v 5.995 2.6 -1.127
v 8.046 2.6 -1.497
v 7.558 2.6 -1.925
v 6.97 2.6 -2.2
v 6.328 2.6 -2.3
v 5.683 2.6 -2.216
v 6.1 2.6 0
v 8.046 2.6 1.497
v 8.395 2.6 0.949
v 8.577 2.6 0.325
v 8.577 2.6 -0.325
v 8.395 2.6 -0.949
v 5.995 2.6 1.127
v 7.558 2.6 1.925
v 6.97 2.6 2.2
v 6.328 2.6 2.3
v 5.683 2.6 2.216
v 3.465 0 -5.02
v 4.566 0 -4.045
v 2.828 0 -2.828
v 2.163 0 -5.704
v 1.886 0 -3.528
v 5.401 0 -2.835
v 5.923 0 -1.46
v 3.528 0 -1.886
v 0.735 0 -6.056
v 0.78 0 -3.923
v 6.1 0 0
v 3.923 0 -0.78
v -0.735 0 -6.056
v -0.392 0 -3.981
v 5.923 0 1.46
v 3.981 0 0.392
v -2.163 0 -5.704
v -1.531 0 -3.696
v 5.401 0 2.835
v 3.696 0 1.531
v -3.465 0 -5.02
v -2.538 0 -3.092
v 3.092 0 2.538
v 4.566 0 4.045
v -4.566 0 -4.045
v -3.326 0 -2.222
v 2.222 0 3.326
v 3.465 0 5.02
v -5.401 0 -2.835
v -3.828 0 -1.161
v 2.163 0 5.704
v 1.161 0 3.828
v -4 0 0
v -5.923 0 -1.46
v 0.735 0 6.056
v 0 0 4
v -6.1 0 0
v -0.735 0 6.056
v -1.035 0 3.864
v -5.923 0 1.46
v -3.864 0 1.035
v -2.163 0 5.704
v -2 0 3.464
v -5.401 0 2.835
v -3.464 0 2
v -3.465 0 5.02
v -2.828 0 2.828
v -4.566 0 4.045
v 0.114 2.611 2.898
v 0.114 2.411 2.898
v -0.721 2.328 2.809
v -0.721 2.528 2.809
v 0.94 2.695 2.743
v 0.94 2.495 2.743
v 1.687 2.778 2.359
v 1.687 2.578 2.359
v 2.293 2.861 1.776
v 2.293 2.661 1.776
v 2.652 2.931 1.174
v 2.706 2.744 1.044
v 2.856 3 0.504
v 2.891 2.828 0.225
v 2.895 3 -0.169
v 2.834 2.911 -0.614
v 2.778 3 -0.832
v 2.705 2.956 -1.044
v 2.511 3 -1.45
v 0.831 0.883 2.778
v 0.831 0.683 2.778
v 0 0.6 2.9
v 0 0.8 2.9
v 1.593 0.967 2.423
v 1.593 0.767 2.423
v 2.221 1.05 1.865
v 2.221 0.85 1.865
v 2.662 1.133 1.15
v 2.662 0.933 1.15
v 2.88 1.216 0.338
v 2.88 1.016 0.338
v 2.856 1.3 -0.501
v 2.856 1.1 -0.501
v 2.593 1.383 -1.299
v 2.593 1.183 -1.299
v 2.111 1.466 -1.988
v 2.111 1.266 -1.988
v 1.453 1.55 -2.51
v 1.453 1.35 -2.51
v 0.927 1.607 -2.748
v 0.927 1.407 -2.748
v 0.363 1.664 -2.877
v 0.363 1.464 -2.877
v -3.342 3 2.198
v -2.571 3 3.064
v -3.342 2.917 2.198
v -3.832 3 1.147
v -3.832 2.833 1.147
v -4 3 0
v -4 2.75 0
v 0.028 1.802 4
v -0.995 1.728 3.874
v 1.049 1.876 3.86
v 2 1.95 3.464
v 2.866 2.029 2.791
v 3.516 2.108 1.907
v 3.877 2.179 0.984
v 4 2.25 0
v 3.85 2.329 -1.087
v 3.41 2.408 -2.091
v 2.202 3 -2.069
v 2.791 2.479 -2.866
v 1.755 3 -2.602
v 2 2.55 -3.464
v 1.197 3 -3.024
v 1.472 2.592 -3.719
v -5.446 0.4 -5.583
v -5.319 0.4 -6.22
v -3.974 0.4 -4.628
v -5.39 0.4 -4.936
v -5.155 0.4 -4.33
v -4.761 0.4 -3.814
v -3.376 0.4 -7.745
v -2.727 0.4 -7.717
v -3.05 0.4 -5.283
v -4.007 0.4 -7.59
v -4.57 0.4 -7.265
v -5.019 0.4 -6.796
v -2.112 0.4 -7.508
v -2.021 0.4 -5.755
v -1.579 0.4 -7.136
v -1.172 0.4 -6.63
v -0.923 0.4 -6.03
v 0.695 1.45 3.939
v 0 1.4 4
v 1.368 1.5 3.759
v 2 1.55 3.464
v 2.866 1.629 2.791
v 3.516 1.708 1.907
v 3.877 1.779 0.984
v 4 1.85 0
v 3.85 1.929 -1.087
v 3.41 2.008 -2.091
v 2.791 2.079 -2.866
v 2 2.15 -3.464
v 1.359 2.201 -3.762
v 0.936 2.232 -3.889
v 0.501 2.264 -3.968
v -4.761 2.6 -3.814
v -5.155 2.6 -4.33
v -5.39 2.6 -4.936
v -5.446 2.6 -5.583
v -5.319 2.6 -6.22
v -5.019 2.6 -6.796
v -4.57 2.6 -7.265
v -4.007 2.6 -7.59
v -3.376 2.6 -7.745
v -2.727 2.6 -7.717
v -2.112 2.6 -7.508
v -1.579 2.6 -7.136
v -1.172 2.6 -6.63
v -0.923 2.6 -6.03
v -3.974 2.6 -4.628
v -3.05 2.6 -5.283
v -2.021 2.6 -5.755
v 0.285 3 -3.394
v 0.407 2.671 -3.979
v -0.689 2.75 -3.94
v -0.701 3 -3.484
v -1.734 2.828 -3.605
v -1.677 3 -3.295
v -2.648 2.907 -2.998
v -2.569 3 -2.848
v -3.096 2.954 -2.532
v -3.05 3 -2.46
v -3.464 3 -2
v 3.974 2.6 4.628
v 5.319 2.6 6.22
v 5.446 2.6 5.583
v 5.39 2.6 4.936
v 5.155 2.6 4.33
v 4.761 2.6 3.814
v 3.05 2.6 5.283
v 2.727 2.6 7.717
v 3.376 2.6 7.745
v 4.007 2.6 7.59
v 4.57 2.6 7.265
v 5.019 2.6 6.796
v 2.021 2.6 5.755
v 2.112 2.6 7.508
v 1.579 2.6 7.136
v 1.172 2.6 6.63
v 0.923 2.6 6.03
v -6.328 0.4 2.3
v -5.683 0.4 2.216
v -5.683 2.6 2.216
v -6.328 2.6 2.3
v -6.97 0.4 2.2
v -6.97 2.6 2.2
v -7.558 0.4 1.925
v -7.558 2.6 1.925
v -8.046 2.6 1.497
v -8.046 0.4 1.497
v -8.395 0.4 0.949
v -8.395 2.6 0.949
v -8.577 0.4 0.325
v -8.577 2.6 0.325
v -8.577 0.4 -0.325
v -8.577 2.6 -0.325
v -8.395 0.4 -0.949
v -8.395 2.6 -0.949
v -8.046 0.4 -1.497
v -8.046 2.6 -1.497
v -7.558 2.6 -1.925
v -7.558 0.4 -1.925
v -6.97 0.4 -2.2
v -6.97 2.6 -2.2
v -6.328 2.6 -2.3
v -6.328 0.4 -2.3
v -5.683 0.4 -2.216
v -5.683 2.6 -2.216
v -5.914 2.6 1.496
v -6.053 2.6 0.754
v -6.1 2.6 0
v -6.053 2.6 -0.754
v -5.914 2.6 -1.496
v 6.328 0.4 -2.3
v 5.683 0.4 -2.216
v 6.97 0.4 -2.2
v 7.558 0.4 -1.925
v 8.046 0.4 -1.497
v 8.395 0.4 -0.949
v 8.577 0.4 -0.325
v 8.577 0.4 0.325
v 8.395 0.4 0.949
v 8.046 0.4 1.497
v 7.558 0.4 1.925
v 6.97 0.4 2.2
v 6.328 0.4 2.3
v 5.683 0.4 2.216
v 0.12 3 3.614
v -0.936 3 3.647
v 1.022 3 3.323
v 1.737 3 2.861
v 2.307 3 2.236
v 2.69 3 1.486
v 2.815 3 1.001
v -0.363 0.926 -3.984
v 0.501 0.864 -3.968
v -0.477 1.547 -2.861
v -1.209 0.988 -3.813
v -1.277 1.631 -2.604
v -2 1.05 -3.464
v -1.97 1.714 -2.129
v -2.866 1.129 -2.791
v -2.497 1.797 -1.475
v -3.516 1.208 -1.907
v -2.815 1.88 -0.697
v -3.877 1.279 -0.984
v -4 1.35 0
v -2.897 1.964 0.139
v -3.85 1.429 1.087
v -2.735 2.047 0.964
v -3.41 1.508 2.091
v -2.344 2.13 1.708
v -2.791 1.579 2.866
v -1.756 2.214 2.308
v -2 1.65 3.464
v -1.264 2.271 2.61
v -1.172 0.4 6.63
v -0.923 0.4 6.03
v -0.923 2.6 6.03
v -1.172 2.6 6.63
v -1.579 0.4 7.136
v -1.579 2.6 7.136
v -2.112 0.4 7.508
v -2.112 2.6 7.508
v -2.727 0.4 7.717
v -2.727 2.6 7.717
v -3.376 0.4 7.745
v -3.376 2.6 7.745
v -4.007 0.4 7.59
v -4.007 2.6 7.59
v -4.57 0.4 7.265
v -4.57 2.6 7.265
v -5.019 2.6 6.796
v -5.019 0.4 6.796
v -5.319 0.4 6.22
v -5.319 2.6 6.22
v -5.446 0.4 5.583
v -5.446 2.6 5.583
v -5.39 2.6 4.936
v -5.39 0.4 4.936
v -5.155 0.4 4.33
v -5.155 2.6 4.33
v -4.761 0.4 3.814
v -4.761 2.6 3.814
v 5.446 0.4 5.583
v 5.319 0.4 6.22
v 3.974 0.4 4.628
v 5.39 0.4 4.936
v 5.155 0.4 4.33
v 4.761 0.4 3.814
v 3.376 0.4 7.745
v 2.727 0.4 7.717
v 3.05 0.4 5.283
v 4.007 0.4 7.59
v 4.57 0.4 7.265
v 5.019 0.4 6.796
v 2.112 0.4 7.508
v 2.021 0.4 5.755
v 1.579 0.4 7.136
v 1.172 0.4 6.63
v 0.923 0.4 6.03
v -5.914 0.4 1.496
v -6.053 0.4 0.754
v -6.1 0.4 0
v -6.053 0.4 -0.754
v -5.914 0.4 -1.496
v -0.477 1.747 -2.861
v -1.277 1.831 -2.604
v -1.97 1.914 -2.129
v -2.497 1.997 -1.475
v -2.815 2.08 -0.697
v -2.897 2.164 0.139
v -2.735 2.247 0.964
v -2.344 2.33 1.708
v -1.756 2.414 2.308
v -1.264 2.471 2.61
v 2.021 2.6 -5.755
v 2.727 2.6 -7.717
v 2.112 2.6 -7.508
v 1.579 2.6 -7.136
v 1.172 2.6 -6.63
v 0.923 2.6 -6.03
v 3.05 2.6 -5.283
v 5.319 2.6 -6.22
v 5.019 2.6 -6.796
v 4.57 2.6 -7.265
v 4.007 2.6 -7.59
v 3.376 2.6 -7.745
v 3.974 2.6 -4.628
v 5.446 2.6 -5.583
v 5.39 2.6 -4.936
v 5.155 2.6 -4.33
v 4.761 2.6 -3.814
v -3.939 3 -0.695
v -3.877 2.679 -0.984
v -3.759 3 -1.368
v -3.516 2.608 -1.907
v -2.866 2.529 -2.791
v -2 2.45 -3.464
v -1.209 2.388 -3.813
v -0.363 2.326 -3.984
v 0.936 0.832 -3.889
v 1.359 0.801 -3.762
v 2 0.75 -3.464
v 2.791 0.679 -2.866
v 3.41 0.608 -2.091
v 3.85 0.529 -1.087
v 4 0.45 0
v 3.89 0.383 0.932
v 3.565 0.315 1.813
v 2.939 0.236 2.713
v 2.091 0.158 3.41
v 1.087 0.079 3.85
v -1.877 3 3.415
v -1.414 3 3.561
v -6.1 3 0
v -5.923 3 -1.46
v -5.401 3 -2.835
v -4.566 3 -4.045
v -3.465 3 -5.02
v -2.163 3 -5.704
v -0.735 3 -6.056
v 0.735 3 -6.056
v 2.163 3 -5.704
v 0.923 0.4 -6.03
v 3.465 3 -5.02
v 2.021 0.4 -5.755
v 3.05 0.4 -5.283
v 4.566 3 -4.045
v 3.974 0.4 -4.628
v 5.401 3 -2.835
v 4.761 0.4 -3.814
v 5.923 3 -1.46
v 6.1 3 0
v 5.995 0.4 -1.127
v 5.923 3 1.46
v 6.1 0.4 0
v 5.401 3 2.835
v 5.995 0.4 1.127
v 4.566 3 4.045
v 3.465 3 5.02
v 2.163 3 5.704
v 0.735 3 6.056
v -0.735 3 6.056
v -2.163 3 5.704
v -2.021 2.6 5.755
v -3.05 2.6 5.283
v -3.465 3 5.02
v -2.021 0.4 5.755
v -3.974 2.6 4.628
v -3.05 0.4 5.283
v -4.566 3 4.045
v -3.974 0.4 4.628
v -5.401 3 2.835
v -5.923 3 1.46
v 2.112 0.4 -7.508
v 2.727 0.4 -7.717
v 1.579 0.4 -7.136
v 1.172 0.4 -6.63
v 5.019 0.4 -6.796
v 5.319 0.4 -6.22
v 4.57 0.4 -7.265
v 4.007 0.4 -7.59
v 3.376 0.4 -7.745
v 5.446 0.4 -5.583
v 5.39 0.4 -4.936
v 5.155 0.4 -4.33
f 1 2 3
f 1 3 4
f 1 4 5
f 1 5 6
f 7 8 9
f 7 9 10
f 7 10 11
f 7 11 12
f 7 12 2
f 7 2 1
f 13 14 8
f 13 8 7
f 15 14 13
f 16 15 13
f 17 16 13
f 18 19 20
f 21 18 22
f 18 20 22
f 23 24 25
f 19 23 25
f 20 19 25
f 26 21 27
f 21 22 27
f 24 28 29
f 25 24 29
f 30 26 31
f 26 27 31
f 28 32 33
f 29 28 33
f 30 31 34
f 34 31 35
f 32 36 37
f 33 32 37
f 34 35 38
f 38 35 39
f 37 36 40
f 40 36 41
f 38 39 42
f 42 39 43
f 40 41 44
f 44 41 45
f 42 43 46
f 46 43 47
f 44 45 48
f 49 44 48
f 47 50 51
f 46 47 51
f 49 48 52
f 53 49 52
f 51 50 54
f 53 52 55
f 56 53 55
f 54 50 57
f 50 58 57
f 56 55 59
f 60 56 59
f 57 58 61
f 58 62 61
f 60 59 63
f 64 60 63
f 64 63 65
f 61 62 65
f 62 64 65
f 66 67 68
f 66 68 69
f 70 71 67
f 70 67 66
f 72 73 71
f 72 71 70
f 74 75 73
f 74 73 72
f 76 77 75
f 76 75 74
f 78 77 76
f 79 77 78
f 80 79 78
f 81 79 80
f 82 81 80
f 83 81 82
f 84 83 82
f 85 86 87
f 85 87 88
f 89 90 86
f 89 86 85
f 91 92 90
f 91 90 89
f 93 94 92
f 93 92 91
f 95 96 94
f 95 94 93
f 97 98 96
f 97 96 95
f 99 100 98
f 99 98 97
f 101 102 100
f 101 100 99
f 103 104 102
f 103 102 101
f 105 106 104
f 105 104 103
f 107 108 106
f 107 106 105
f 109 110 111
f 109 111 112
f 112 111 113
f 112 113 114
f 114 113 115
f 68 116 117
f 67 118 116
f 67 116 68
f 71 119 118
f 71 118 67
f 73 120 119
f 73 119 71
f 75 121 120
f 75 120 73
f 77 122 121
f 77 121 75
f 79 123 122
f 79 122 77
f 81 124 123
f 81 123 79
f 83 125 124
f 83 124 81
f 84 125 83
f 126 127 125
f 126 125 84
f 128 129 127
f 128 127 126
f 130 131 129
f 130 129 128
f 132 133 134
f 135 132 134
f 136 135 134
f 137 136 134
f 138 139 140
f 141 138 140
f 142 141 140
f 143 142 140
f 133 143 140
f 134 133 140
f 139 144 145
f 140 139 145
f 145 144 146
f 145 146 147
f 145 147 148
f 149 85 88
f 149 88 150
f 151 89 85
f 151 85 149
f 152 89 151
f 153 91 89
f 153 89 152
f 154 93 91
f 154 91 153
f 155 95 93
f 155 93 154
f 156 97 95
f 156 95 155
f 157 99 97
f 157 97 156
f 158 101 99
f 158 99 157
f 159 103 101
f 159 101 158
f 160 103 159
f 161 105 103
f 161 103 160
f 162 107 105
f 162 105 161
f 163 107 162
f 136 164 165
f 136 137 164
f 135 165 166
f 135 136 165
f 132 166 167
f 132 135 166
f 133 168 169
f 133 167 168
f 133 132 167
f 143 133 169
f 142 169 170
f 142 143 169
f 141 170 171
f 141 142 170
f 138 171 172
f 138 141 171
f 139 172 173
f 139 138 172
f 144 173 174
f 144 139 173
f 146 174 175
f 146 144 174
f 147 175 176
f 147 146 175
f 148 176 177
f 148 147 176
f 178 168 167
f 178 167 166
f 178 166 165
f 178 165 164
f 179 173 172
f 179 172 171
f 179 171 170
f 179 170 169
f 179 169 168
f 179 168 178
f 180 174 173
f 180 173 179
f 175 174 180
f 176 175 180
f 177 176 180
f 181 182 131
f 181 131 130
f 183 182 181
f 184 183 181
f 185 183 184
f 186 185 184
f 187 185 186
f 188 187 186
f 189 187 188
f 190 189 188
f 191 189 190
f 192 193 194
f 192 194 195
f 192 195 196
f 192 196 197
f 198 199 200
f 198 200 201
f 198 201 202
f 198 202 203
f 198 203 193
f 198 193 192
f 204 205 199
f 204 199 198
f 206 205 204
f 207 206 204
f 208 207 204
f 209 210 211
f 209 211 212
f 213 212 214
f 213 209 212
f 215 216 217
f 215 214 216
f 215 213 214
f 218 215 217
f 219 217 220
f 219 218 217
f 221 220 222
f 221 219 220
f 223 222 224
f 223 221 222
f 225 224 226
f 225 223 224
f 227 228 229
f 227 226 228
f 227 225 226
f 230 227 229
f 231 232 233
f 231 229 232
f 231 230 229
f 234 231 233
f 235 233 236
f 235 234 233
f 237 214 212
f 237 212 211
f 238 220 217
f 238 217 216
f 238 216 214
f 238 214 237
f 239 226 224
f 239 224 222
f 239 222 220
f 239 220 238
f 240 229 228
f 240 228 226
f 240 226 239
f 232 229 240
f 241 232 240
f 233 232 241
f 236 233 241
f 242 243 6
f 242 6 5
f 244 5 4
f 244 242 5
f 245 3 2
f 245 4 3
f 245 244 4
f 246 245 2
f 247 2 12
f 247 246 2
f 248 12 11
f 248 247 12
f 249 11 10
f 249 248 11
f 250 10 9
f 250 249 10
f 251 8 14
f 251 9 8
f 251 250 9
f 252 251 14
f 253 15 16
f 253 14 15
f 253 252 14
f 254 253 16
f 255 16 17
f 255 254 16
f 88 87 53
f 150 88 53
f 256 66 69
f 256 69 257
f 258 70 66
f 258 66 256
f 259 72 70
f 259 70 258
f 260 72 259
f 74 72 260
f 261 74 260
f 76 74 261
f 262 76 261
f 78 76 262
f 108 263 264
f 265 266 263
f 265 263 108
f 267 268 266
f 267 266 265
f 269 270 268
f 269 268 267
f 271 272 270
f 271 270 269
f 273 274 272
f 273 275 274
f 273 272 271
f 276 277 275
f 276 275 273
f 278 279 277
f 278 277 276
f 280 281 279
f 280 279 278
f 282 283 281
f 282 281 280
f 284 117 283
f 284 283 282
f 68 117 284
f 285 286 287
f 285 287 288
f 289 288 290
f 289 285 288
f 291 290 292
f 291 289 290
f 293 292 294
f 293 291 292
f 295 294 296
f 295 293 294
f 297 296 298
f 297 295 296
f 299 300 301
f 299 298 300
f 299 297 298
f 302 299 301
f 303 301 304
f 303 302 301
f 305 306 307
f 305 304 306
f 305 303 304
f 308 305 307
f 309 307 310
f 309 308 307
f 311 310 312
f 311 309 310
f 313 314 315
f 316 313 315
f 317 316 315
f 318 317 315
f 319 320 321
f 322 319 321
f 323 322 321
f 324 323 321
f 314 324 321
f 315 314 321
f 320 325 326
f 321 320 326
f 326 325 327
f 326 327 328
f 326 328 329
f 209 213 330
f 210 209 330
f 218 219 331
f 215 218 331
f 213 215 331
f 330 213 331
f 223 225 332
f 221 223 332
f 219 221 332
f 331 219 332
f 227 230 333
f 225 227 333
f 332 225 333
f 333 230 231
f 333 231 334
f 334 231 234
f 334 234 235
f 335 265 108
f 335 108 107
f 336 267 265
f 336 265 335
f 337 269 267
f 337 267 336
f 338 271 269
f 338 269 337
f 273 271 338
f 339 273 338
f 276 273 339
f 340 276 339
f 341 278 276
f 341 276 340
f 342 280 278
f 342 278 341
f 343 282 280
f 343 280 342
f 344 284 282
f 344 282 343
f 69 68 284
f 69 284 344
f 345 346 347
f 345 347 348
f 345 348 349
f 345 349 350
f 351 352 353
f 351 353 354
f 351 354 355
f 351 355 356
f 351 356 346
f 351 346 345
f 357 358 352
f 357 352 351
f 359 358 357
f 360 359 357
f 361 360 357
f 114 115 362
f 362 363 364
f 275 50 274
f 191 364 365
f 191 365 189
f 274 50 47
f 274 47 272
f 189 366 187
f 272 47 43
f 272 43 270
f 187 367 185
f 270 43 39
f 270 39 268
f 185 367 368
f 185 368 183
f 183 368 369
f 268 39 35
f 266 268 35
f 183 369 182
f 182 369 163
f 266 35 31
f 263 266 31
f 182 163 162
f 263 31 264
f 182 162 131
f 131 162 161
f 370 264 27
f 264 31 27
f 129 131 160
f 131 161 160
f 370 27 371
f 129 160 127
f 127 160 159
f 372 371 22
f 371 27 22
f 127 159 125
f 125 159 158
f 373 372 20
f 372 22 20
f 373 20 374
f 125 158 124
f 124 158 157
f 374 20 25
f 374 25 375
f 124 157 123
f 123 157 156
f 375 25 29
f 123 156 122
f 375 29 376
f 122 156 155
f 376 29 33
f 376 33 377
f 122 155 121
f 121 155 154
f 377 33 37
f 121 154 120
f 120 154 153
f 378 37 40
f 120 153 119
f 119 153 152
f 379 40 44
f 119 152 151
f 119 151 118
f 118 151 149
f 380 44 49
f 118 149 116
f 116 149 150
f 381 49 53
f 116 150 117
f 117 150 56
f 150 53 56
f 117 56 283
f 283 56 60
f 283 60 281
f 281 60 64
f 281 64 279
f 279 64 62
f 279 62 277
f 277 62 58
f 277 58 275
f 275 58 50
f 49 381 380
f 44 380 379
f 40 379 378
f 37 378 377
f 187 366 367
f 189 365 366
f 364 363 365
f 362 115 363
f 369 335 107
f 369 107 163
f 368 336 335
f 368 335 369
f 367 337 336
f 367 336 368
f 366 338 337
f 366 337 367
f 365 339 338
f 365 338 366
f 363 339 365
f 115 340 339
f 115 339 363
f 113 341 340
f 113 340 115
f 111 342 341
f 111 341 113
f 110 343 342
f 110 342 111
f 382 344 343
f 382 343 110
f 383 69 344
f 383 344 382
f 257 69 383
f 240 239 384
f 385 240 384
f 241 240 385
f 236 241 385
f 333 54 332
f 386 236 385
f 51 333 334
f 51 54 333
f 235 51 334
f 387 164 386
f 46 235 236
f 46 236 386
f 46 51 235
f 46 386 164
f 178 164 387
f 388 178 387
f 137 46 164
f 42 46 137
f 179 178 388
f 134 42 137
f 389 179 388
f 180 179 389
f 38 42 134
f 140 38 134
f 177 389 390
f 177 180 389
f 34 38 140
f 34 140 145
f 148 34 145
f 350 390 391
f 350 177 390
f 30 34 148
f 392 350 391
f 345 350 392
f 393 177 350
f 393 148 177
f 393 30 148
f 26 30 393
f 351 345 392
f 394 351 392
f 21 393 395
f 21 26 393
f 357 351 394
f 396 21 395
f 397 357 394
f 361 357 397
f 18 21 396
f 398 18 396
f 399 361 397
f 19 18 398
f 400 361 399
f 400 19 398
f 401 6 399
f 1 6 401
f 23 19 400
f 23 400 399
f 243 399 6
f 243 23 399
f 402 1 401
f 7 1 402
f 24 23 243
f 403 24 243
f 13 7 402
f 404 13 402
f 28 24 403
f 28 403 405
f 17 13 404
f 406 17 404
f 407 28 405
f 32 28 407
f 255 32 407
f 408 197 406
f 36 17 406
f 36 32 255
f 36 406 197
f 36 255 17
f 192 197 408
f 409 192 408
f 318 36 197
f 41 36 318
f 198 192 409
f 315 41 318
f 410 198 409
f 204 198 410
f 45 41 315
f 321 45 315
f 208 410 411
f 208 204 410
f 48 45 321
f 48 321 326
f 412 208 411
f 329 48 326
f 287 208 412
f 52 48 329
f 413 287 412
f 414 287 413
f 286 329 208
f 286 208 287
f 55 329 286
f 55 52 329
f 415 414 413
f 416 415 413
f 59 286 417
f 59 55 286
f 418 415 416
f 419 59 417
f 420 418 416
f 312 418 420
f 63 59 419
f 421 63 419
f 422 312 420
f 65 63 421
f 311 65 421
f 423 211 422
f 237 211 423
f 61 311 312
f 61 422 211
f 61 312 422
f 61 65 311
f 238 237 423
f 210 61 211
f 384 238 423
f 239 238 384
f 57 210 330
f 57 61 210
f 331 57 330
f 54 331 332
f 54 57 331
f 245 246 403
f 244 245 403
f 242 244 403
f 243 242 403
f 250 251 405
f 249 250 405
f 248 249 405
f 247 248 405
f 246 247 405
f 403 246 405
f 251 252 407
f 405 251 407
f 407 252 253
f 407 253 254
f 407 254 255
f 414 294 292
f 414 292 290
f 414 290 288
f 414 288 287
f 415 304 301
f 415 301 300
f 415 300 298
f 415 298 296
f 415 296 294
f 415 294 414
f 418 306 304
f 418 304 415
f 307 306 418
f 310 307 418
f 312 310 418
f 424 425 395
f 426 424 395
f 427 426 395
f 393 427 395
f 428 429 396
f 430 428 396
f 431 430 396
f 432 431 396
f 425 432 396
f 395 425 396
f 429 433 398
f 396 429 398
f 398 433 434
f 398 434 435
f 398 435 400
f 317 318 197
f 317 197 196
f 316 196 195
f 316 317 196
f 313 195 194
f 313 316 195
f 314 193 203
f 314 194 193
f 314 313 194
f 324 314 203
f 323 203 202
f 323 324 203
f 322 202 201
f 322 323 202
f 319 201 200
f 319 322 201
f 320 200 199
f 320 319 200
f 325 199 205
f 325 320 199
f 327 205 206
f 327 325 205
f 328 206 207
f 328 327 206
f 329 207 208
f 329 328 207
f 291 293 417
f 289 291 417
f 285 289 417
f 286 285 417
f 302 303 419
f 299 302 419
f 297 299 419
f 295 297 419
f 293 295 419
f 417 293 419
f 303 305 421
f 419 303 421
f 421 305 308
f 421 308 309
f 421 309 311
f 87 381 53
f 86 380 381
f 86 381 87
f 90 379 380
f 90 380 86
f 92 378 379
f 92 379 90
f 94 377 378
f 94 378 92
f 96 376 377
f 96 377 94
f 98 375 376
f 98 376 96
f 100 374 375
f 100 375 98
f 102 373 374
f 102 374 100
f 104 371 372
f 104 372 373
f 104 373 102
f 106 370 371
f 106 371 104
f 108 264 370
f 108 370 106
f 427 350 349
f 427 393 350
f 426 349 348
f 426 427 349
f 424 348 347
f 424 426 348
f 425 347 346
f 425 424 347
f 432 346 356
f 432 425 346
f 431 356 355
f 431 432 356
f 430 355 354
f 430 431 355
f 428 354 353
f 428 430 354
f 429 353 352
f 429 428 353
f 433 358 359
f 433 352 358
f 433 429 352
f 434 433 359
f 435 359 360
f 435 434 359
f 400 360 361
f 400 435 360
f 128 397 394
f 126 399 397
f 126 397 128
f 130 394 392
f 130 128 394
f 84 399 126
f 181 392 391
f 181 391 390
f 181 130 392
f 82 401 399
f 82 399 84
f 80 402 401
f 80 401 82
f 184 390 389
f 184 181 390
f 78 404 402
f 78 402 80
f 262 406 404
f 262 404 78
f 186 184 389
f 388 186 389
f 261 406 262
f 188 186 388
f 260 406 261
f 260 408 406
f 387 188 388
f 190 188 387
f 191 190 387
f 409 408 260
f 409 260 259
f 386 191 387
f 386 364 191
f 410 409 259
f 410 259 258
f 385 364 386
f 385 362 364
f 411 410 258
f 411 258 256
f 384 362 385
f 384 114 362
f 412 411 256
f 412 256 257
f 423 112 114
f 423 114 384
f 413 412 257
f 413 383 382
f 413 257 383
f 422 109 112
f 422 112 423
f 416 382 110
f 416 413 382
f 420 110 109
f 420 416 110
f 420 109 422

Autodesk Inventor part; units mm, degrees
sketch "Sketch1" plane through (0, 0, 0) normal (0, 1, 0) x (-1, 0, 0)
  circle A0 centre (0, 0) radius 6.1
  circle A1 centre (0, 0) radius 4
  dimension "d0" = 12.2
  dimension "d1" = 8
extrude "Extrusion1" add sketch "Sketch1" along normal blind 3
ref_plane "Work Plane1" through (0, 0.4, 0) normal (0, 1, 0) x (-1, 0, 0)
sketch "Sketch2" plane through (0, 0.4, 0) normal (0, 1, 0) x (-1, 0, 0)
  circle A0 centre (0, 0) radius 8.6 construction
  circle A1 centre (-6.3, 0) radius 2.3
  circle A2 centre (0, 0) radius 4 projected
  dimension "d5" = 17.2
extrude "Extrusion2" add sketch "Sketch2" along normal blind 2.2 contours A1
pattern_circular "Circular Pattern1" count 6 over 360 about axis through (0, -10, 0) along (0, 1, 0) of "Extrusion2"
sketch "Sketch3" plane through (0, 0, 0) normal (1, 0, 0) x (0, 1, 0)
  line L0 (3, 4) -> (0, 4) projected
  line L1 (0, 4) -> (0.6, 2.9)
  line L2 (0, -6.1) -> (0, 6.1) projected
  line L3 (0, 8.54) -> (0, -8.54) projected
  line L4 (0.6, 2.9) -> (0.8, 2.9)
  line L5 (0.8, 2.9) -> (1.4, 4)
  line L6 (1.4, 4) -> (0, 4)
  point P0 (0, 0)
  dimension "d12" = 0.2
  dimension "d13" = 1.1
  dimension "d14" = 1.4
coil "Coil1" sketch "Sketch3" operation add axis through (0, -10, 0) along (0, 1, 0) pitch 1.8 turns 2.4 hand right
sketch "Sketch4" plane through (0, 3, 0) normal (0, 1, 0) x (1, 0, 0)
  circle A0 centre (0, 0) radius 6.1
extrude "Extrusion3" cut sketch "Sketch4" along normal blind 10
properties part number "bearing-clamp" material "PET Plastic"
